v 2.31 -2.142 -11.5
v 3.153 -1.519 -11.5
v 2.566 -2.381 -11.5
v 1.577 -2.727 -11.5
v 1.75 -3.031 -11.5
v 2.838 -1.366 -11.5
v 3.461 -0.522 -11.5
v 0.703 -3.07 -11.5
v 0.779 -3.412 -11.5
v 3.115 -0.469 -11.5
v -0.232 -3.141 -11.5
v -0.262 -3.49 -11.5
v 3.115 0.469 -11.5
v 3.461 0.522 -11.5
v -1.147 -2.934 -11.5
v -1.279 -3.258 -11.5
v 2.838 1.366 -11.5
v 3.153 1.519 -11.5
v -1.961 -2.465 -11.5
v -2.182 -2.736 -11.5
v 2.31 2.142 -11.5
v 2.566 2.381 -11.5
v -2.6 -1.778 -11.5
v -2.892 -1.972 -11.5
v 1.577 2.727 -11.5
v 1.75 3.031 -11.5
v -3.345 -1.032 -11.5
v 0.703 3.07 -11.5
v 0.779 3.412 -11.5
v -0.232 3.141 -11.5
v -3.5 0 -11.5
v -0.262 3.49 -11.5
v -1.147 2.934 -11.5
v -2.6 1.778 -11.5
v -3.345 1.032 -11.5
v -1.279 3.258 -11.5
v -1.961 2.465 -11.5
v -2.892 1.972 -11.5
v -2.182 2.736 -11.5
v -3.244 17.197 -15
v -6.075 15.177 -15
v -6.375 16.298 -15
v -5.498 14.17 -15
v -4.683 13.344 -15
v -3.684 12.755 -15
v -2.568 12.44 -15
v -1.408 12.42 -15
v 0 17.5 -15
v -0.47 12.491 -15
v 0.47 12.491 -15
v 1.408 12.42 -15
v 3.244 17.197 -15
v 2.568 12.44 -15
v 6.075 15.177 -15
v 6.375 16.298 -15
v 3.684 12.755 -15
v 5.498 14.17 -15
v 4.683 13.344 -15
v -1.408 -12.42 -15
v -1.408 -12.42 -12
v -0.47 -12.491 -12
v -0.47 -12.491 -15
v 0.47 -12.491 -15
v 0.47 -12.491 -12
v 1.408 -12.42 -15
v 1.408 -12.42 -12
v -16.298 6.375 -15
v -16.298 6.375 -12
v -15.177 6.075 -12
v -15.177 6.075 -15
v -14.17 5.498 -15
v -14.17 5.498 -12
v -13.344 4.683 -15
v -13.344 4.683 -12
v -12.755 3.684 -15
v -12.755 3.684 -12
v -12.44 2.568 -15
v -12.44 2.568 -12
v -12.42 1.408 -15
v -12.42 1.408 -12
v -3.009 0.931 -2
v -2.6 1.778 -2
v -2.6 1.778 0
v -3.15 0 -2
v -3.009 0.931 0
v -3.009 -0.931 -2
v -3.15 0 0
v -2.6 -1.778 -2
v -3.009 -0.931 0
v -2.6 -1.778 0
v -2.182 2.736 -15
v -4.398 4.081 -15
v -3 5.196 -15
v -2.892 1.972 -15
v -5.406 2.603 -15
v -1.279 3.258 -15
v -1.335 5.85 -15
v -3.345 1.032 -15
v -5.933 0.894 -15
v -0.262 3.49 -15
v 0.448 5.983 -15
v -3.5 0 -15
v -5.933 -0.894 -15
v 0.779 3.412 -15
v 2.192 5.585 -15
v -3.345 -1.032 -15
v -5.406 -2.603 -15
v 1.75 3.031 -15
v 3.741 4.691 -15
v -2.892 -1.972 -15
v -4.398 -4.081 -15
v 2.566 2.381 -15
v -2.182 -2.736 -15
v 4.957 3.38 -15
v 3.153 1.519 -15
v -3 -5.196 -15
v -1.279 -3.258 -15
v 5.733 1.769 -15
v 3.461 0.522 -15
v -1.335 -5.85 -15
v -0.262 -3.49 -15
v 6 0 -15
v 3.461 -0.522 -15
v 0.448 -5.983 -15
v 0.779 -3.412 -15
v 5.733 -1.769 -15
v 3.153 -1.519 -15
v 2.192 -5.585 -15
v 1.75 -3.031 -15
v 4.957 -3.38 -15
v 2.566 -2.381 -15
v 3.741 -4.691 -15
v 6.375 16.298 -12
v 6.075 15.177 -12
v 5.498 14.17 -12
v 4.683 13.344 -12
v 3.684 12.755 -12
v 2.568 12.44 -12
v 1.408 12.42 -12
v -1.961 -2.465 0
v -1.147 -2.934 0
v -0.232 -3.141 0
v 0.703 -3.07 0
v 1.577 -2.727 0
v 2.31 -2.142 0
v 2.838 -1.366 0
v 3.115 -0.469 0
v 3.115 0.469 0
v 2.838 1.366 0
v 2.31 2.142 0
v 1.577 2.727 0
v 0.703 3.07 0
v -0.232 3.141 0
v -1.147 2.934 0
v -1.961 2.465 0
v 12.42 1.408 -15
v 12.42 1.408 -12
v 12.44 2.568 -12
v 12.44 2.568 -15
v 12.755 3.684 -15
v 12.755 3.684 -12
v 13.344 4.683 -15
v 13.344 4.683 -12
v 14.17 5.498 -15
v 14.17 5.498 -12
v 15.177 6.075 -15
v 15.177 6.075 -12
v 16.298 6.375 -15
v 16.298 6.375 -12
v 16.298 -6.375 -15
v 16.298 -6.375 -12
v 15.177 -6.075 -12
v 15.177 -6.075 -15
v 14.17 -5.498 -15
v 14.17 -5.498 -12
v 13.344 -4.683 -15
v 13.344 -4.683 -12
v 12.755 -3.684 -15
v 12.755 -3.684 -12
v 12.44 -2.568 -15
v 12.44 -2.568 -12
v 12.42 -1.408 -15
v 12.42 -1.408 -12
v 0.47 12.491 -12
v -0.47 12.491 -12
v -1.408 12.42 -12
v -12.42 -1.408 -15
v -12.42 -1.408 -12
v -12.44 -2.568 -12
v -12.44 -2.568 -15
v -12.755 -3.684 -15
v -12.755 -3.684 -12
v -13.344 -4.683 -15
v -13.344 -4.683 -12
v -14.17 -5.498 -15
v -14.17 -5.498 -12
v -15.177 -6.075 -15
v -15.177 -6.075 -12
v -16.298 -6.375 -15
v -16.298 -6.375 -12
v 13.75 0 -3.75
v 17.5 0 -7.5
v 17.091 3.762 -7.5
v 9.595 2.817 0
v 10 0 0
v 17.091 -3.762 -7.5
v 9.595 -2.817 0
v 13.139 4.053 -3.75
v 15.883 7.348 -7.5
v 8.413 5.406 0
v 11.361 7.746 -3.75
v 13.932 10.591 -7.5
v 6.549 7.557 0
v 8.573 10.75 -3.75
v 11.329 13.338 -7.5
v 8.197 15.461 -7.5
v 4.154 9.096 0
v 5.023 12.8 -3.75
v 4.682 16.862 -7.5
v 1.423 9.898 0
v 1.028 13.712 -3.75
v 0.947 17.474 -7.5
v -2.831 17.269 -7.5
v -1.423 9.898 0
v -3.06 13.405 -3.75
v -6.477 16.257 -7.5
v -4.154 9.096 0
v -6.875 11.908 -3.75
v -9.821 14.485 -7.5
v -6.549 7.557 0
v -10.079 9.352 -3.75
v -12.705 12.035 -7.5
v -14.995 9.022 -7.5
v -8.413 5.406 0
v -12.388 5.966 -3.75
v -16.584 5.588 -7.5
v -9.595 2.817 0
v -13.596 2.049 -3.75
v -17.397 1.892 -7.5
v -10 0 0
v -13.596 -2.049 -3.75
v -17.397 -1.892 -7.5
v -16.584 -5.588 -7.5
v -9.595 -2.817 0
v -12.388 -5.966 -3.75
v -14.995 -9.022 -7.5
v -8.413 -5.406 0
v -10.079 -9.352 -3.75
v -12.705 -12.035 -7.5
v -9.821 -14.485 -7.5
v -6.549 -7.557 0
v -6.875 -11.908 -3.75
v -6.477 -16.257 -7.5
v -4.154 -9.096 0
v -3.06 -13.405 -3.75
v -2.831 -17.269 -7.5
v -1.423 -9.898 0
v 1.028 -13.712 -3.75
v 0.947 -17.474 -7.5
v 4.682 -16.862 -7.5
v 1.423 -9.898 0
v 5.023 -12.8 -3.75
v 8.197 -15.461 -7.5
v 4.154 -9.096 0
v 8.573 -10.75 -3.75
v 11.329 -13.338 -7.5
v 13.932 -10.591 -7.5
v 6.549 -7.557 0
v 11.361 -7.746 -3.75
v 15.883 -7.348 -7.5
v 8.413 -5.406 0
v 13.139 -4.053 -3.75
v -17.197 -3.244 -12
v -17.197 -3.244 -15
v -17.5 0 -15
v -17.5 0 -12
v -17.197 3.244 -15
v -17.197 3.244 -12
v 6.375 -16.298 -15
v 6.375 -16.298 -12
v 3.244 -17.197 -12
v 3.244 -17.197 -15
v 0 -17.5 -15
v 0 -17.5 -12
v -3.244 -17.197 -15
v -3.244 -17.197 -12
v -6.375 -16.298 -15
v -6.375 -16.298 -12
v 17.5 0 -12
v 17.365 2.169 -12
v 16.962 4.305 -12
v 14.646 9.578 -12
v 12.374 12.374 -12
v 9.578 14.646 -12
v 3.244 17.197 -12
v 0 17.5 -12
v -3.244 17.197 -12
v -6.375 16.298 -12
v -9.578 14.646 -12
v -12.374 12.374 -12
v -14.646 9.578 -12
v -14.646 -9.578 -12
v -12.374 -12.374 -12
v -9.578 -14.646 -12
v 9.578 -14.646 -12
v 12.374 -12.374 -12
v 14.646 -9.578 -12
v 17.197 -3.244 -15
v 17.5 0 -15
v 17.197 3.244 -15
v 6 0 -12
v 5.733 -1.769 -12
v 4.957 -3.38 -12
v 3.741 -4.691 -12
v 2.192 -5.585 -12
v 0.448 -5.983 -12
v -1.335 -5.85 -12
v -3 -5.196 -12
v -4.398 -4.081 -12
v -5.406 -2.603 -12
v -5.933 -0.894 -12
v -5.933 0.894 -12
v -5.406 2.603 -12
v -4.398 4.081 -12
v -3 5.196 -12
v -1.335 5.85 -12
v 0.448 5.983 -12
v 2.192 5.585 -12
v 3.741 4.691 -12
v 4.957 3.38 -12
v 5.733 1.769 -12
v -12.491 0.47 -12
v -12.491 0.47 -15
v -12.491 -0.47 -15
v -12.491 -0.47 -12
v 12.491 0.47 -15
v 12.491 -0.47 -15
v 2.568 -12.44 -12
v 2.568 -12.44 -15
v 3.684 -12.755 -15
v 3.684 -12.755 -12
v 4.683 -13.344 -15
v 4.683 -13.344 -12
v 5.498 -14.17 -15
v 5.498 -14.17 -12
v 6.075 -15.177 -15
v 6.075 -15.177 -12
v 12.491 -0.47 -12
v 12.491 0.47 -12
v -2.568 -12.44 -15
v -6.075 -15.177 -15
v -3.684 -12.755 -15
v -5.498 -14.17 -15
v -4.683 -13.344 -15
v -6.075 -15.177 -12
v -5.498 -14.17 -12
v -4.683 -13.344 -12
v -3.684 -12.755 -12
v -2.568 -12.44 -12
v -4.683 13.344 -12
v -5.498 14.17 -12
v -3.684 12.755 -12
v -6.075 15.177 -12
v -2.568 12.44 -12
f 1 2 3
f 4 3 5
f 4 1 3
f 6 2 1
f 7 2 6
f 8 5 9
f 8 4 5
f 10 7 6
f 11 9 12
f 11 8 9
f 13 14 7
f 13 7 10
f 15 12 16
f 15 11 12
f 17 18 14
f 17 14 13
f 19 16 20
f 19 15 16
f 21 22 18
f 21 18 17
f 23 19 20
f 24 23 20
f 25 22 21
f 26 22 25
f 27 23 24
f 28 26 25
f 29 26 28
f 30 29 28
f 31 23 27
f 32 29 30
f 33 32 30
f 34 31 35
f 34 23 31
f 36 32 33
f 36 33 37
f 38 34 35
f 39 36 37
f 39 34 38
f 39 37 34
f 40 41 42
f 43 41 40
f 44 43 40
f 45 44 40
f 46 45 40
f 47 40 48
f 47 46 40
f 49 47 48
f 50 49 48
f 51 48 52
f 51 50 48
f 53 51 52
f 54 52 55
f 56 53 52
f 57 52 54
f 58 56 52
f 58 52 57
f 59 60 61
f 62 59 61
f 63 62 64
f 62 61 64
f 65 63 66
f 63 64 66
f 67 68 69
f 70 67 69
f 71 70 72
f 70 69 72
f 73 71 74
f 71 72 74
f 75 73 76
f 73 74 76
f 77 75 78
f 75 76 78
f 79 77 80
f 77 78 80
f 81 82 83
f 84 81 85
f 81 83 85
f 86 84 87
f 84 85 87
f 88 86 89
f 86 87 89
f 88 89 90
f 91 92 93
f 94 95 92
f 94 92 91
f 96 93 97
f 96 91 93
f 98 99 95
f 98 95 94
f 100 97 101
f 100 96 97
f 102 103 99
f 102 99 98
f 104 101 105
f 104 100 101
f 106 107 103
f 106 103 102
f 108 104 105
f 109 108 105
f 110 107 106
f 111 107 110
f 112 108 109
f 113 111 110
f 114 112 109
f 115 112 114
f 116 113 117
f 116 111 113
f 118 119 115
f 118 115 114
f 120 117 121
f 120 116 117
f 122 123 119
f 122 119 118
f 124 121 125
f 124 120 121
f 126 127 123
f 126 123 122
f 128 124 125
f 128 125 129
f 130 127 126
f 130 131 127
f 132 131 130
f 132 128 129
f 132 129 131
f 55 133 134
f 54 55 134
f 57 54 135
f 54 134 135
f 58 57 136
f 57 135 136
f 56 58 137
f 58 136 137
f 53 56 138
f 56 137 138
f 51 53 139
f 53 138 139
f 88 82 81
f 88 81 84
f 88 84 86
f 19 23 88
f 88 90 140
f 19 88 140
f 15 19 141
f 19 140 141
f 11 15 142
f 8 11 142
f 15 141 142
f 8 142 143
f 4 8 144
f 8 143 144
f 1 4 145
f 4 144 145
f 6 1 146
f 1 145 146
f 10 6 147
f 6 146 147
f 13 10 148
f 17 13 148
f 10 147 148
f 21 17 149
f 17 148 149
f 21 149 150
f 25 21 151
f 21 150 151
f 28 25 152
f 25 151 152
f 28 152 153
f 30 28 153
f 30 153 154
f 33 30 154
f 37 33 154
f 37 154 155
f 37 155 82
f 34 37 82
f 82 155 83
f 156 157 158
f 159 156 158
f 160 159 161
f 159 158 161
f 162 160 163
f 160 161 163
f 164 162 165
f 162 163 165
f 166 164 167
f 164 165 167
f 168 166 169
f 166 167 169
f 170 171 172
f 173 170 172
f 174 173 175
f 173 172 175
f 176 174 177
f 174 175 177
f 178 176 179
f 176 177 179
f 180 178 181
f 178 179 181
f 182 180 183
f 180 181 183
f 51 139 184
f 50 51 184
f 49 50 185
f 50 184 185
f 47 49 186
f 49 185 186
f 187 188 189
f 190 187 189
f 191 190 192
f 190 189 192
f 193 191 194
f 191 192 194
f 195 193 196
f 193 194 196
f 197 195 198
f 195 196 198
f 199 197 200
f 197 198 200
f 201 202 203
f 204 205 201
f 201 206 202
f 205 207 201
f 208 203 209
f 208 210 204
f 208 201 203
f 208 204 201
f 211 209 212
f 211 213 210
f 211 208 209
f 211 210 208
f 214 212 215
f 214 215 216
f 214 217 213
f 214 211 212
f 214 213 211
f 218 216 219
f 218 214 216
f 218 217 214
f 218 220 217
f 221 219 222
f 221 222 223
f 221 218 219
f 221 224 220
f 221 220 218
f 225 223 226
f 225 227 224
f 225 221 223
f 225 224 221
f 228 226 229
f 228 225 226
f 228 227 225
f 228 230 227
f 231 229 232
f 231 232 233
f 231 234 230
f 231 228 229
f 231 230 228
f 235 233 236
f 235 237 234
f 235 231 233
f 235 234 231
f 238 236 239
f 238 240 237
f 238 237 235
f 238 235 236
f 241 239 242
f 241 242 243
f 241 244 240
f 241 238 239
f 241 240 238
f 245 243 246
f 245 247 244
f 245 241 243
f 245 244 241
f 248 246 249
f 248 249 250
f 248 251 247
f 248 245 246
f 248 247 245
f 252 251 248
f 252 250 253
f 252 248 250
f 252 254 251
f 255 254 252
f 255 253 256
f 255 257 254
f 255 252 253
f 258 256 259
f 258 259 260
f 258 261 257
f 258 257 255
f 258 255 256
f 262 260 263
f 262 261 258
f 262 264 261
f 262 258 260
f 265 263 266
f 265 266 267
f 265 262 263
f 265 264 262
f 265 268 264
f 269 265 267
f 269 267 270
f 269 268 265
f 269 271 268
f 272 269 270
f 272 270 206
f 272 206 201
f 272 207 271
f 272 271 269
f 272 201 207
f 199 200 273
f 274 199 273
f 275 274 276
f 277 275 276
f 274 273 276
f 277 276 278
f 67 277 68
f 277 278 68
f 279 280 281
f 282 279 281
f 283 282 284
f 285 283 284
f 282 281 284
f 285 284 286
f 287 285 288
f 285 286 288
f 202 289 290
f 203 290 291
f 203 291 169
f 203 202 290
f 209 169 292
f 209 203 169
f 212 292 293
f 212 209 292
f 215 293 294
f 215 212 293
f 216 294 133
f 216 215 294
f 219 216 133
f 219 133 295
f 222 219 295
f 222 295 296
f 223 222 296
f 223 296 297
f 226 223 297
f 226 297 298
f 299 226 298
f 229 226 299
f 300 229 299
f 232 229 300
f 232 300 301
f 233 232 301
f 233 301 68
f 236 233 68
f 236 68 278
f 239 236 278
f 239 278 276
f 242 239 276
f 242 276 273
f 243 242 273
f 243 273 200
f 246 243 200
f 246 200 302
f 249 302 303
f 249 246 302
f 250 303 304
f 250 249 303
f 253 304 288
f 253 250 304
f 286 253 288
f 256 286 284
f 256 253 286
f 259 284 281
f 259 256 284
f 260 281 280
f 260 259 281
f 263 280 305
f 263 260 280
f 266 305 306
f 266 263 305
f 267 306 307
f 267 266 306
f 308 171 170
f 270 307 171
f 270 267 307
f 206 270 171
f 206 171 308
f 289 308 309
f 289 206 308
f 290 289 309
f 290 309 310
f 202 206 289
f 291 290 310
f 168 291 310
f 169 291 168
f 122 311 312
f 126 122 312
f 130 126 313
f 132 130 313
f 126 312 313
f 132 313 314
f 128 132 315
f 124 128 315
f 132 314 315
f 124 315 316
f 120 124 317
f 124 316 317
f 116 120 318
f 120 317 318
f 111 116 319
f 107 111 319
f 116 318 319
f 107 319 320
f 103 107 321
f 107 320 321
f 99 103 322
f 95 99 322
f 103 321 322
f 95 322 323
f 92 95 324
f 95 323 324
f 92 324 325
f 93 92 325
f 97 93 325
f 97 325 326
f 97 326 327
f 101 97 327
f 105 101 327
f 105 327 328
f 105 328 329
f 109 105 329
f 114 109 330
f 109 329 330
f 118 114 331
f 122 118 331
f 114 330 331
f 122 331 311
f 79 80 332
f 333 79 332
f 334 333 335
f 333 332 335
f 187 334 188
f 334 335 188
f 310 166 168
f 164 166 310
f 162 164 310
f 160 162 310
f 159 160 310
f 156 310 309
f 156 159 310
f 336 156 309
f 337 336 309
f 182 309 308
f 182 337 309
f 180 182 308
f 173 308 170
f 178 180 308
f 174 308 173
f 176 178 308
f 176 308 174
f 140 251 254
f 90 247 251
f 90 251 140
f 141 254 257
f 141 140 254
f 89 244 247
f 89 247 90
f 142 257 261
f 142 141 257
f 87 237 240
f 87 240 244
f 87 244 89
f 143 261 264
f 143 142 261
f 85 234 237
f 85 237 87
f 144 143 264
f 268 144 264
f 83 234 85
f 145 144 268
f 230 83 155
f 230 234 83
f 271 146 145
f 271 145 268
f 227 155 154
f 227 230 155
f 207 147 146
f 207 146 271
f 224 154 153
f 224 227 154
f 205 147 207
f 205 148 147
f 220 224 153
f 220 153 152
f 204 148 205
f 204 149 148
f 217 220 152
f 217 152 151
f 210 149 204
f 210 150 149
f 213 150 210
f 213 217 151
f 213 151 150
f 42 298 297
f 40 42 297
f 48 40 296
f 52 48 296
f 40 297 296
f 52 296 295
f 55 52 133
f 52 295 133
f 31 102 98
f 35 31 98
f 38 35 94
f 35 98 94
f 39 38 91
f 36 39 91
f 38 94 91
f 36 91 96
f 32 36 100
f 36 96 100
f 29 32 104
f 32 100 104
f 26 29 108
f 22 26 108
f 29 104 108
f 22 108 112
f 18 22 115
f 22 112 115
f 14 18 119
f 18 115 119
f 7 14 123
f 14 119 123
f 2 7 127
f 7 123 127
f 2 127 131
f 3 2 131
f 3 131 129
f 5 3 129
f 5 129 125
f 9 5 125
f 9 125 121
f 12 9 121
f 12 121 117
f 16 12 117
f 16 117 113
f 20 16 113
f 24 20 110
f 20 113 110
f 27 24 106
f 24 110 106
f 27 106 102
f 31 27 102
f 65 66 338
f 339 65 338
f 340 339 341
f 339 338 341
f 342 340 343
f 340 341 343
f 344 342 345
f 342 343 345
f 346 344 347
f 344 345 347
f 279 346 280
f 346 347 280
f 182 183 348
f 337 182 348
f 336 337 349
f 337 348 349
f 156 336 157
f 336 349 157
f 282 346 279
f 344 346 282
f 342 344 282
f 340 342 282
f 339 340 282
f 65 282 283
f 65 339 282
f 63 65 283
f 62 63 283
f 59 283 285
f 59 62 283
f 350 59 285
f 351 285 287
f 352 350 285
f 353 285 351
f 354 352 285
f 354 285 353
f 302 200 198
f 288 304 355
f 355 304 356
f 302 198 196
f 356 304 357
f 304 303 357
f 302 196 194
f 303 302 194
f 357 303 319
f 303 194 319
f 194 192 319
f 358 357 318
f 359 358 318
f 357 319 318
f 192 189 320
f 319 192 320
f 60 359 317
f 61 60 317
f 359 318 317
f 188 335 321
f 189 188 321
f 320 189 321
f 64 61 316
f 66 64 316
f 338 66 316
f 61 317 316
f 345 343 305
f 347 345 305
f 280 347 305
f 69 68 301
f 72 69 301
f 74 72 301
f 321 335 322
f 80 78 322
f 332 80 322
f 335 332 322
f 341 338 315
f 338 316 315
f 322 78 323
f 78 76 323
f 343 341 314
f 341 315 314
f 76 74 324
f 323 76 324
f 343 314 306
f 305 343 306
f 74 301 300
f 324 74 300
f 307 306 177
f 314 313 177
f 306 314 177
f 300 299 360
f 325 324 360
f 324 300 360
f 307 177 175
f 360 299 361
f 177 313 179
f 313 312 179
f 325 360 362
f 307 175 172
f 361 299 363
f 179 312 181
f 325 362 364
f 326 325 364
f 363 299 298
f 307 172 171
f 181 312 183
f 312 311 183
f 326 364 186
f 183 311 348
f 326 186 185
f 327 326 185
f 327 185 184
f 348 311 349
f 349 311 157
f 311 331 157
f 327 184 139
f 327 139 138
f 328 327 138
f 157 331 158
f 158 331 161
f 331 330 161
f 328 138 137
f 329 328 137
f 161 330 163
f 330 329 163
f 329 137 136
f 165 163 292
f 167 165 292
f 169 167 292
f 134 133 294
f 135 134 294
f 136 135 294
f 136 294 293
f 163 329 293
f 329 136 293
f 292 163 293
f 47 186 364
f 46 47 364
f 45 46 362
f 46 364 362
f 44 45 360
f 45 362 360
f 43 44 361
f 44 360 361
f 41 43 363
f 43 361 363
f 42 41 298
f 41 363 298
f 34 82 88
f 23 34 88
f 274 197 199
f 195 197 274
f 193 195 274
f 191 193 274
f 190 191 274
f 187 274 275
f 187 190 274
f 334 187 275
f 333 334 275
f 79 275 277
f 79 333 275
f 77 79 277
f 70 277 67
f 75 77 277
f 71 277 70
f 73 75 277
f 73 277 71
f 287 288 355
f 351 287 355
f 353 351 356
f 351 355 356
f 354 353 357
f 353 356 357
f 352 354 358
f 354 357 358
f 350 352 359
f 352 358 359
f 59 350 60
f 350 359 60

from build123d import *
from build123d.topology import SkipClean

# Parameters (mm, degrees)
BASEMODELSKETCH_R                  = 17.5
BASEMODEL_DEPTH                    = 12
KEYTOOTH_DEPTH                     = 3
PATTERNKEY_COUNT                   = 4
CENTERHOLESUPPORTEXTRUSIONSKETCH_R = 6
CENTERHOLESUPPORTEXTRUSION_DEPTH   = 3
INNERHOLEWITHKEY_DEPTH             = 29.939592257
HOLEFORSPRINGAXLESKETCH_R          = 3.5
HOLEFORSPRINGAXLE_DEPTH            = 3.5
ENCODERKEYEND_R                    = 3.15
ENDOERKEYEND_DEPTH                 = 2
CHAMFER1_SIZE                      = 7.5


with BuildPart() as part:
    # BaseModelSketch → BaseModel (new body)
    with BuildSketch(Plane.XY):
        Circle(BASEMODELSKETCH_R)
    extrude(amount=-BASEMODEL_DEPTH)

    # KeyToothSketch → KeyTooth (add)
    with BuildSketch(Plane(origin=(0, 0, -12), x_dir=(-1, 0, 0), z_dir=(0, 0, -1))):
        with BuildLine():
            ThreePointArc((6.375, -16.297526653), (4.683181341, -13.344473155), (1.407662434, -12.420486563))
            ThreePointArc((1.407662434, -12.420486563), (0, -12.5), (-1.407662434, -12.420486563))
            ThreePointArc((-1.407662434, -12.420486563), (-4.683181341, -13.344473155), (-6.375, -16.297526653))
            ThreePointArc((-6.375, -16.297526653), (0, -17.5), (6.375, -16.297526653))
        make_face()
    keytooth = extrude(amount=KEYTOOTH_DEPTH)

    # PatternKey: KeyTooth ×4 about axis
    with SkipClean():  # the faces are left unmerged after this step: merging them gives an invalid solid
        patternkey_axis = Axis((0, 0, 0), (0, 0, 1))
        for i in range(1, PATTERNKEY_COUNT):
            add(keytooth.rotate(patternkey_axis, i * 360 / PATTERNKEY_COUNT))

    # CenterHoleSupportExtrusionSketch → CenterHoleSupportExtrusion (add)
    with SkipClean():  # the faces are left unmerged after this step: merging them gives an invalid solid
        with BuildSketch(Plane(origin=(0, 0, -12), x_dir=(-1, 0, 0), z_dir=(0, 0, -1))):
            with Locations(Location((0, 0, 0), (0, 0, 180))):
                Circle(CENTERHOLESUPPORTEXTRUSIONSKETCH_R)
        extrude(amount=CENTERHOLESUPPORTEXTRUSION_DEPTH)

    # InnerHoleWithKeySketch → InnerHoleWithKey (cut, through all)
    with SkipClean():  # the faces are left unmerged after this step: merging them gives an invalid solid
        with BuildSketch(Plane.XY):
            with BuildLine():
                Line((-2.6, 1.778341924), (-2.6, -1.778341924))
                ThreePointArc((-2.6, -1.778341924), (3.15, 0), (-2.6, 1.778341924))
            make_face()
        extrude(amount=-INNERHOLEWITHKEY_DEPTH, mode=Mode.SUBTRACT)

    # HoleforSpringAxleSketch → HoleforSpringAxle (cut)
    with SkipClean():  # the faces are left unmerged after this step: merging them gives an invalid solid
        with BuildSketch(Plane(origin=(0, 0, -15), x_dir=(-1, 0, 0), z_dir=(0, 0, -1))):
            Circle(HOLEFORSPRINGAXLESKETCH_R)
        extrude(amount=-HOLEFORSPRINGAXLE_DEPTH, mode=Mode.SUBTRACT)

    # EncoderKeyEnd → EndoerKeyEnd (cut)
    with SkipClean():  # the faces are left unmerged after this step: merging them gives an invalid solid
        with BuildSketch(Plane.XY):
            Circle(ENCODERKEYEND_R)
        extrude(amount=-ENDOERKEYEND_DEPTH, mode=Mode.SUBTRACT)

    # Chamfer1
    chamfer1_edges = [part.edges().sort_by_distance(p)[0] for p in [
        (-17.5, 0, 0),
    ]]
    chamfer(chamfer1_edges, length=CHAMFER1_SIZE)


solid = part.part
